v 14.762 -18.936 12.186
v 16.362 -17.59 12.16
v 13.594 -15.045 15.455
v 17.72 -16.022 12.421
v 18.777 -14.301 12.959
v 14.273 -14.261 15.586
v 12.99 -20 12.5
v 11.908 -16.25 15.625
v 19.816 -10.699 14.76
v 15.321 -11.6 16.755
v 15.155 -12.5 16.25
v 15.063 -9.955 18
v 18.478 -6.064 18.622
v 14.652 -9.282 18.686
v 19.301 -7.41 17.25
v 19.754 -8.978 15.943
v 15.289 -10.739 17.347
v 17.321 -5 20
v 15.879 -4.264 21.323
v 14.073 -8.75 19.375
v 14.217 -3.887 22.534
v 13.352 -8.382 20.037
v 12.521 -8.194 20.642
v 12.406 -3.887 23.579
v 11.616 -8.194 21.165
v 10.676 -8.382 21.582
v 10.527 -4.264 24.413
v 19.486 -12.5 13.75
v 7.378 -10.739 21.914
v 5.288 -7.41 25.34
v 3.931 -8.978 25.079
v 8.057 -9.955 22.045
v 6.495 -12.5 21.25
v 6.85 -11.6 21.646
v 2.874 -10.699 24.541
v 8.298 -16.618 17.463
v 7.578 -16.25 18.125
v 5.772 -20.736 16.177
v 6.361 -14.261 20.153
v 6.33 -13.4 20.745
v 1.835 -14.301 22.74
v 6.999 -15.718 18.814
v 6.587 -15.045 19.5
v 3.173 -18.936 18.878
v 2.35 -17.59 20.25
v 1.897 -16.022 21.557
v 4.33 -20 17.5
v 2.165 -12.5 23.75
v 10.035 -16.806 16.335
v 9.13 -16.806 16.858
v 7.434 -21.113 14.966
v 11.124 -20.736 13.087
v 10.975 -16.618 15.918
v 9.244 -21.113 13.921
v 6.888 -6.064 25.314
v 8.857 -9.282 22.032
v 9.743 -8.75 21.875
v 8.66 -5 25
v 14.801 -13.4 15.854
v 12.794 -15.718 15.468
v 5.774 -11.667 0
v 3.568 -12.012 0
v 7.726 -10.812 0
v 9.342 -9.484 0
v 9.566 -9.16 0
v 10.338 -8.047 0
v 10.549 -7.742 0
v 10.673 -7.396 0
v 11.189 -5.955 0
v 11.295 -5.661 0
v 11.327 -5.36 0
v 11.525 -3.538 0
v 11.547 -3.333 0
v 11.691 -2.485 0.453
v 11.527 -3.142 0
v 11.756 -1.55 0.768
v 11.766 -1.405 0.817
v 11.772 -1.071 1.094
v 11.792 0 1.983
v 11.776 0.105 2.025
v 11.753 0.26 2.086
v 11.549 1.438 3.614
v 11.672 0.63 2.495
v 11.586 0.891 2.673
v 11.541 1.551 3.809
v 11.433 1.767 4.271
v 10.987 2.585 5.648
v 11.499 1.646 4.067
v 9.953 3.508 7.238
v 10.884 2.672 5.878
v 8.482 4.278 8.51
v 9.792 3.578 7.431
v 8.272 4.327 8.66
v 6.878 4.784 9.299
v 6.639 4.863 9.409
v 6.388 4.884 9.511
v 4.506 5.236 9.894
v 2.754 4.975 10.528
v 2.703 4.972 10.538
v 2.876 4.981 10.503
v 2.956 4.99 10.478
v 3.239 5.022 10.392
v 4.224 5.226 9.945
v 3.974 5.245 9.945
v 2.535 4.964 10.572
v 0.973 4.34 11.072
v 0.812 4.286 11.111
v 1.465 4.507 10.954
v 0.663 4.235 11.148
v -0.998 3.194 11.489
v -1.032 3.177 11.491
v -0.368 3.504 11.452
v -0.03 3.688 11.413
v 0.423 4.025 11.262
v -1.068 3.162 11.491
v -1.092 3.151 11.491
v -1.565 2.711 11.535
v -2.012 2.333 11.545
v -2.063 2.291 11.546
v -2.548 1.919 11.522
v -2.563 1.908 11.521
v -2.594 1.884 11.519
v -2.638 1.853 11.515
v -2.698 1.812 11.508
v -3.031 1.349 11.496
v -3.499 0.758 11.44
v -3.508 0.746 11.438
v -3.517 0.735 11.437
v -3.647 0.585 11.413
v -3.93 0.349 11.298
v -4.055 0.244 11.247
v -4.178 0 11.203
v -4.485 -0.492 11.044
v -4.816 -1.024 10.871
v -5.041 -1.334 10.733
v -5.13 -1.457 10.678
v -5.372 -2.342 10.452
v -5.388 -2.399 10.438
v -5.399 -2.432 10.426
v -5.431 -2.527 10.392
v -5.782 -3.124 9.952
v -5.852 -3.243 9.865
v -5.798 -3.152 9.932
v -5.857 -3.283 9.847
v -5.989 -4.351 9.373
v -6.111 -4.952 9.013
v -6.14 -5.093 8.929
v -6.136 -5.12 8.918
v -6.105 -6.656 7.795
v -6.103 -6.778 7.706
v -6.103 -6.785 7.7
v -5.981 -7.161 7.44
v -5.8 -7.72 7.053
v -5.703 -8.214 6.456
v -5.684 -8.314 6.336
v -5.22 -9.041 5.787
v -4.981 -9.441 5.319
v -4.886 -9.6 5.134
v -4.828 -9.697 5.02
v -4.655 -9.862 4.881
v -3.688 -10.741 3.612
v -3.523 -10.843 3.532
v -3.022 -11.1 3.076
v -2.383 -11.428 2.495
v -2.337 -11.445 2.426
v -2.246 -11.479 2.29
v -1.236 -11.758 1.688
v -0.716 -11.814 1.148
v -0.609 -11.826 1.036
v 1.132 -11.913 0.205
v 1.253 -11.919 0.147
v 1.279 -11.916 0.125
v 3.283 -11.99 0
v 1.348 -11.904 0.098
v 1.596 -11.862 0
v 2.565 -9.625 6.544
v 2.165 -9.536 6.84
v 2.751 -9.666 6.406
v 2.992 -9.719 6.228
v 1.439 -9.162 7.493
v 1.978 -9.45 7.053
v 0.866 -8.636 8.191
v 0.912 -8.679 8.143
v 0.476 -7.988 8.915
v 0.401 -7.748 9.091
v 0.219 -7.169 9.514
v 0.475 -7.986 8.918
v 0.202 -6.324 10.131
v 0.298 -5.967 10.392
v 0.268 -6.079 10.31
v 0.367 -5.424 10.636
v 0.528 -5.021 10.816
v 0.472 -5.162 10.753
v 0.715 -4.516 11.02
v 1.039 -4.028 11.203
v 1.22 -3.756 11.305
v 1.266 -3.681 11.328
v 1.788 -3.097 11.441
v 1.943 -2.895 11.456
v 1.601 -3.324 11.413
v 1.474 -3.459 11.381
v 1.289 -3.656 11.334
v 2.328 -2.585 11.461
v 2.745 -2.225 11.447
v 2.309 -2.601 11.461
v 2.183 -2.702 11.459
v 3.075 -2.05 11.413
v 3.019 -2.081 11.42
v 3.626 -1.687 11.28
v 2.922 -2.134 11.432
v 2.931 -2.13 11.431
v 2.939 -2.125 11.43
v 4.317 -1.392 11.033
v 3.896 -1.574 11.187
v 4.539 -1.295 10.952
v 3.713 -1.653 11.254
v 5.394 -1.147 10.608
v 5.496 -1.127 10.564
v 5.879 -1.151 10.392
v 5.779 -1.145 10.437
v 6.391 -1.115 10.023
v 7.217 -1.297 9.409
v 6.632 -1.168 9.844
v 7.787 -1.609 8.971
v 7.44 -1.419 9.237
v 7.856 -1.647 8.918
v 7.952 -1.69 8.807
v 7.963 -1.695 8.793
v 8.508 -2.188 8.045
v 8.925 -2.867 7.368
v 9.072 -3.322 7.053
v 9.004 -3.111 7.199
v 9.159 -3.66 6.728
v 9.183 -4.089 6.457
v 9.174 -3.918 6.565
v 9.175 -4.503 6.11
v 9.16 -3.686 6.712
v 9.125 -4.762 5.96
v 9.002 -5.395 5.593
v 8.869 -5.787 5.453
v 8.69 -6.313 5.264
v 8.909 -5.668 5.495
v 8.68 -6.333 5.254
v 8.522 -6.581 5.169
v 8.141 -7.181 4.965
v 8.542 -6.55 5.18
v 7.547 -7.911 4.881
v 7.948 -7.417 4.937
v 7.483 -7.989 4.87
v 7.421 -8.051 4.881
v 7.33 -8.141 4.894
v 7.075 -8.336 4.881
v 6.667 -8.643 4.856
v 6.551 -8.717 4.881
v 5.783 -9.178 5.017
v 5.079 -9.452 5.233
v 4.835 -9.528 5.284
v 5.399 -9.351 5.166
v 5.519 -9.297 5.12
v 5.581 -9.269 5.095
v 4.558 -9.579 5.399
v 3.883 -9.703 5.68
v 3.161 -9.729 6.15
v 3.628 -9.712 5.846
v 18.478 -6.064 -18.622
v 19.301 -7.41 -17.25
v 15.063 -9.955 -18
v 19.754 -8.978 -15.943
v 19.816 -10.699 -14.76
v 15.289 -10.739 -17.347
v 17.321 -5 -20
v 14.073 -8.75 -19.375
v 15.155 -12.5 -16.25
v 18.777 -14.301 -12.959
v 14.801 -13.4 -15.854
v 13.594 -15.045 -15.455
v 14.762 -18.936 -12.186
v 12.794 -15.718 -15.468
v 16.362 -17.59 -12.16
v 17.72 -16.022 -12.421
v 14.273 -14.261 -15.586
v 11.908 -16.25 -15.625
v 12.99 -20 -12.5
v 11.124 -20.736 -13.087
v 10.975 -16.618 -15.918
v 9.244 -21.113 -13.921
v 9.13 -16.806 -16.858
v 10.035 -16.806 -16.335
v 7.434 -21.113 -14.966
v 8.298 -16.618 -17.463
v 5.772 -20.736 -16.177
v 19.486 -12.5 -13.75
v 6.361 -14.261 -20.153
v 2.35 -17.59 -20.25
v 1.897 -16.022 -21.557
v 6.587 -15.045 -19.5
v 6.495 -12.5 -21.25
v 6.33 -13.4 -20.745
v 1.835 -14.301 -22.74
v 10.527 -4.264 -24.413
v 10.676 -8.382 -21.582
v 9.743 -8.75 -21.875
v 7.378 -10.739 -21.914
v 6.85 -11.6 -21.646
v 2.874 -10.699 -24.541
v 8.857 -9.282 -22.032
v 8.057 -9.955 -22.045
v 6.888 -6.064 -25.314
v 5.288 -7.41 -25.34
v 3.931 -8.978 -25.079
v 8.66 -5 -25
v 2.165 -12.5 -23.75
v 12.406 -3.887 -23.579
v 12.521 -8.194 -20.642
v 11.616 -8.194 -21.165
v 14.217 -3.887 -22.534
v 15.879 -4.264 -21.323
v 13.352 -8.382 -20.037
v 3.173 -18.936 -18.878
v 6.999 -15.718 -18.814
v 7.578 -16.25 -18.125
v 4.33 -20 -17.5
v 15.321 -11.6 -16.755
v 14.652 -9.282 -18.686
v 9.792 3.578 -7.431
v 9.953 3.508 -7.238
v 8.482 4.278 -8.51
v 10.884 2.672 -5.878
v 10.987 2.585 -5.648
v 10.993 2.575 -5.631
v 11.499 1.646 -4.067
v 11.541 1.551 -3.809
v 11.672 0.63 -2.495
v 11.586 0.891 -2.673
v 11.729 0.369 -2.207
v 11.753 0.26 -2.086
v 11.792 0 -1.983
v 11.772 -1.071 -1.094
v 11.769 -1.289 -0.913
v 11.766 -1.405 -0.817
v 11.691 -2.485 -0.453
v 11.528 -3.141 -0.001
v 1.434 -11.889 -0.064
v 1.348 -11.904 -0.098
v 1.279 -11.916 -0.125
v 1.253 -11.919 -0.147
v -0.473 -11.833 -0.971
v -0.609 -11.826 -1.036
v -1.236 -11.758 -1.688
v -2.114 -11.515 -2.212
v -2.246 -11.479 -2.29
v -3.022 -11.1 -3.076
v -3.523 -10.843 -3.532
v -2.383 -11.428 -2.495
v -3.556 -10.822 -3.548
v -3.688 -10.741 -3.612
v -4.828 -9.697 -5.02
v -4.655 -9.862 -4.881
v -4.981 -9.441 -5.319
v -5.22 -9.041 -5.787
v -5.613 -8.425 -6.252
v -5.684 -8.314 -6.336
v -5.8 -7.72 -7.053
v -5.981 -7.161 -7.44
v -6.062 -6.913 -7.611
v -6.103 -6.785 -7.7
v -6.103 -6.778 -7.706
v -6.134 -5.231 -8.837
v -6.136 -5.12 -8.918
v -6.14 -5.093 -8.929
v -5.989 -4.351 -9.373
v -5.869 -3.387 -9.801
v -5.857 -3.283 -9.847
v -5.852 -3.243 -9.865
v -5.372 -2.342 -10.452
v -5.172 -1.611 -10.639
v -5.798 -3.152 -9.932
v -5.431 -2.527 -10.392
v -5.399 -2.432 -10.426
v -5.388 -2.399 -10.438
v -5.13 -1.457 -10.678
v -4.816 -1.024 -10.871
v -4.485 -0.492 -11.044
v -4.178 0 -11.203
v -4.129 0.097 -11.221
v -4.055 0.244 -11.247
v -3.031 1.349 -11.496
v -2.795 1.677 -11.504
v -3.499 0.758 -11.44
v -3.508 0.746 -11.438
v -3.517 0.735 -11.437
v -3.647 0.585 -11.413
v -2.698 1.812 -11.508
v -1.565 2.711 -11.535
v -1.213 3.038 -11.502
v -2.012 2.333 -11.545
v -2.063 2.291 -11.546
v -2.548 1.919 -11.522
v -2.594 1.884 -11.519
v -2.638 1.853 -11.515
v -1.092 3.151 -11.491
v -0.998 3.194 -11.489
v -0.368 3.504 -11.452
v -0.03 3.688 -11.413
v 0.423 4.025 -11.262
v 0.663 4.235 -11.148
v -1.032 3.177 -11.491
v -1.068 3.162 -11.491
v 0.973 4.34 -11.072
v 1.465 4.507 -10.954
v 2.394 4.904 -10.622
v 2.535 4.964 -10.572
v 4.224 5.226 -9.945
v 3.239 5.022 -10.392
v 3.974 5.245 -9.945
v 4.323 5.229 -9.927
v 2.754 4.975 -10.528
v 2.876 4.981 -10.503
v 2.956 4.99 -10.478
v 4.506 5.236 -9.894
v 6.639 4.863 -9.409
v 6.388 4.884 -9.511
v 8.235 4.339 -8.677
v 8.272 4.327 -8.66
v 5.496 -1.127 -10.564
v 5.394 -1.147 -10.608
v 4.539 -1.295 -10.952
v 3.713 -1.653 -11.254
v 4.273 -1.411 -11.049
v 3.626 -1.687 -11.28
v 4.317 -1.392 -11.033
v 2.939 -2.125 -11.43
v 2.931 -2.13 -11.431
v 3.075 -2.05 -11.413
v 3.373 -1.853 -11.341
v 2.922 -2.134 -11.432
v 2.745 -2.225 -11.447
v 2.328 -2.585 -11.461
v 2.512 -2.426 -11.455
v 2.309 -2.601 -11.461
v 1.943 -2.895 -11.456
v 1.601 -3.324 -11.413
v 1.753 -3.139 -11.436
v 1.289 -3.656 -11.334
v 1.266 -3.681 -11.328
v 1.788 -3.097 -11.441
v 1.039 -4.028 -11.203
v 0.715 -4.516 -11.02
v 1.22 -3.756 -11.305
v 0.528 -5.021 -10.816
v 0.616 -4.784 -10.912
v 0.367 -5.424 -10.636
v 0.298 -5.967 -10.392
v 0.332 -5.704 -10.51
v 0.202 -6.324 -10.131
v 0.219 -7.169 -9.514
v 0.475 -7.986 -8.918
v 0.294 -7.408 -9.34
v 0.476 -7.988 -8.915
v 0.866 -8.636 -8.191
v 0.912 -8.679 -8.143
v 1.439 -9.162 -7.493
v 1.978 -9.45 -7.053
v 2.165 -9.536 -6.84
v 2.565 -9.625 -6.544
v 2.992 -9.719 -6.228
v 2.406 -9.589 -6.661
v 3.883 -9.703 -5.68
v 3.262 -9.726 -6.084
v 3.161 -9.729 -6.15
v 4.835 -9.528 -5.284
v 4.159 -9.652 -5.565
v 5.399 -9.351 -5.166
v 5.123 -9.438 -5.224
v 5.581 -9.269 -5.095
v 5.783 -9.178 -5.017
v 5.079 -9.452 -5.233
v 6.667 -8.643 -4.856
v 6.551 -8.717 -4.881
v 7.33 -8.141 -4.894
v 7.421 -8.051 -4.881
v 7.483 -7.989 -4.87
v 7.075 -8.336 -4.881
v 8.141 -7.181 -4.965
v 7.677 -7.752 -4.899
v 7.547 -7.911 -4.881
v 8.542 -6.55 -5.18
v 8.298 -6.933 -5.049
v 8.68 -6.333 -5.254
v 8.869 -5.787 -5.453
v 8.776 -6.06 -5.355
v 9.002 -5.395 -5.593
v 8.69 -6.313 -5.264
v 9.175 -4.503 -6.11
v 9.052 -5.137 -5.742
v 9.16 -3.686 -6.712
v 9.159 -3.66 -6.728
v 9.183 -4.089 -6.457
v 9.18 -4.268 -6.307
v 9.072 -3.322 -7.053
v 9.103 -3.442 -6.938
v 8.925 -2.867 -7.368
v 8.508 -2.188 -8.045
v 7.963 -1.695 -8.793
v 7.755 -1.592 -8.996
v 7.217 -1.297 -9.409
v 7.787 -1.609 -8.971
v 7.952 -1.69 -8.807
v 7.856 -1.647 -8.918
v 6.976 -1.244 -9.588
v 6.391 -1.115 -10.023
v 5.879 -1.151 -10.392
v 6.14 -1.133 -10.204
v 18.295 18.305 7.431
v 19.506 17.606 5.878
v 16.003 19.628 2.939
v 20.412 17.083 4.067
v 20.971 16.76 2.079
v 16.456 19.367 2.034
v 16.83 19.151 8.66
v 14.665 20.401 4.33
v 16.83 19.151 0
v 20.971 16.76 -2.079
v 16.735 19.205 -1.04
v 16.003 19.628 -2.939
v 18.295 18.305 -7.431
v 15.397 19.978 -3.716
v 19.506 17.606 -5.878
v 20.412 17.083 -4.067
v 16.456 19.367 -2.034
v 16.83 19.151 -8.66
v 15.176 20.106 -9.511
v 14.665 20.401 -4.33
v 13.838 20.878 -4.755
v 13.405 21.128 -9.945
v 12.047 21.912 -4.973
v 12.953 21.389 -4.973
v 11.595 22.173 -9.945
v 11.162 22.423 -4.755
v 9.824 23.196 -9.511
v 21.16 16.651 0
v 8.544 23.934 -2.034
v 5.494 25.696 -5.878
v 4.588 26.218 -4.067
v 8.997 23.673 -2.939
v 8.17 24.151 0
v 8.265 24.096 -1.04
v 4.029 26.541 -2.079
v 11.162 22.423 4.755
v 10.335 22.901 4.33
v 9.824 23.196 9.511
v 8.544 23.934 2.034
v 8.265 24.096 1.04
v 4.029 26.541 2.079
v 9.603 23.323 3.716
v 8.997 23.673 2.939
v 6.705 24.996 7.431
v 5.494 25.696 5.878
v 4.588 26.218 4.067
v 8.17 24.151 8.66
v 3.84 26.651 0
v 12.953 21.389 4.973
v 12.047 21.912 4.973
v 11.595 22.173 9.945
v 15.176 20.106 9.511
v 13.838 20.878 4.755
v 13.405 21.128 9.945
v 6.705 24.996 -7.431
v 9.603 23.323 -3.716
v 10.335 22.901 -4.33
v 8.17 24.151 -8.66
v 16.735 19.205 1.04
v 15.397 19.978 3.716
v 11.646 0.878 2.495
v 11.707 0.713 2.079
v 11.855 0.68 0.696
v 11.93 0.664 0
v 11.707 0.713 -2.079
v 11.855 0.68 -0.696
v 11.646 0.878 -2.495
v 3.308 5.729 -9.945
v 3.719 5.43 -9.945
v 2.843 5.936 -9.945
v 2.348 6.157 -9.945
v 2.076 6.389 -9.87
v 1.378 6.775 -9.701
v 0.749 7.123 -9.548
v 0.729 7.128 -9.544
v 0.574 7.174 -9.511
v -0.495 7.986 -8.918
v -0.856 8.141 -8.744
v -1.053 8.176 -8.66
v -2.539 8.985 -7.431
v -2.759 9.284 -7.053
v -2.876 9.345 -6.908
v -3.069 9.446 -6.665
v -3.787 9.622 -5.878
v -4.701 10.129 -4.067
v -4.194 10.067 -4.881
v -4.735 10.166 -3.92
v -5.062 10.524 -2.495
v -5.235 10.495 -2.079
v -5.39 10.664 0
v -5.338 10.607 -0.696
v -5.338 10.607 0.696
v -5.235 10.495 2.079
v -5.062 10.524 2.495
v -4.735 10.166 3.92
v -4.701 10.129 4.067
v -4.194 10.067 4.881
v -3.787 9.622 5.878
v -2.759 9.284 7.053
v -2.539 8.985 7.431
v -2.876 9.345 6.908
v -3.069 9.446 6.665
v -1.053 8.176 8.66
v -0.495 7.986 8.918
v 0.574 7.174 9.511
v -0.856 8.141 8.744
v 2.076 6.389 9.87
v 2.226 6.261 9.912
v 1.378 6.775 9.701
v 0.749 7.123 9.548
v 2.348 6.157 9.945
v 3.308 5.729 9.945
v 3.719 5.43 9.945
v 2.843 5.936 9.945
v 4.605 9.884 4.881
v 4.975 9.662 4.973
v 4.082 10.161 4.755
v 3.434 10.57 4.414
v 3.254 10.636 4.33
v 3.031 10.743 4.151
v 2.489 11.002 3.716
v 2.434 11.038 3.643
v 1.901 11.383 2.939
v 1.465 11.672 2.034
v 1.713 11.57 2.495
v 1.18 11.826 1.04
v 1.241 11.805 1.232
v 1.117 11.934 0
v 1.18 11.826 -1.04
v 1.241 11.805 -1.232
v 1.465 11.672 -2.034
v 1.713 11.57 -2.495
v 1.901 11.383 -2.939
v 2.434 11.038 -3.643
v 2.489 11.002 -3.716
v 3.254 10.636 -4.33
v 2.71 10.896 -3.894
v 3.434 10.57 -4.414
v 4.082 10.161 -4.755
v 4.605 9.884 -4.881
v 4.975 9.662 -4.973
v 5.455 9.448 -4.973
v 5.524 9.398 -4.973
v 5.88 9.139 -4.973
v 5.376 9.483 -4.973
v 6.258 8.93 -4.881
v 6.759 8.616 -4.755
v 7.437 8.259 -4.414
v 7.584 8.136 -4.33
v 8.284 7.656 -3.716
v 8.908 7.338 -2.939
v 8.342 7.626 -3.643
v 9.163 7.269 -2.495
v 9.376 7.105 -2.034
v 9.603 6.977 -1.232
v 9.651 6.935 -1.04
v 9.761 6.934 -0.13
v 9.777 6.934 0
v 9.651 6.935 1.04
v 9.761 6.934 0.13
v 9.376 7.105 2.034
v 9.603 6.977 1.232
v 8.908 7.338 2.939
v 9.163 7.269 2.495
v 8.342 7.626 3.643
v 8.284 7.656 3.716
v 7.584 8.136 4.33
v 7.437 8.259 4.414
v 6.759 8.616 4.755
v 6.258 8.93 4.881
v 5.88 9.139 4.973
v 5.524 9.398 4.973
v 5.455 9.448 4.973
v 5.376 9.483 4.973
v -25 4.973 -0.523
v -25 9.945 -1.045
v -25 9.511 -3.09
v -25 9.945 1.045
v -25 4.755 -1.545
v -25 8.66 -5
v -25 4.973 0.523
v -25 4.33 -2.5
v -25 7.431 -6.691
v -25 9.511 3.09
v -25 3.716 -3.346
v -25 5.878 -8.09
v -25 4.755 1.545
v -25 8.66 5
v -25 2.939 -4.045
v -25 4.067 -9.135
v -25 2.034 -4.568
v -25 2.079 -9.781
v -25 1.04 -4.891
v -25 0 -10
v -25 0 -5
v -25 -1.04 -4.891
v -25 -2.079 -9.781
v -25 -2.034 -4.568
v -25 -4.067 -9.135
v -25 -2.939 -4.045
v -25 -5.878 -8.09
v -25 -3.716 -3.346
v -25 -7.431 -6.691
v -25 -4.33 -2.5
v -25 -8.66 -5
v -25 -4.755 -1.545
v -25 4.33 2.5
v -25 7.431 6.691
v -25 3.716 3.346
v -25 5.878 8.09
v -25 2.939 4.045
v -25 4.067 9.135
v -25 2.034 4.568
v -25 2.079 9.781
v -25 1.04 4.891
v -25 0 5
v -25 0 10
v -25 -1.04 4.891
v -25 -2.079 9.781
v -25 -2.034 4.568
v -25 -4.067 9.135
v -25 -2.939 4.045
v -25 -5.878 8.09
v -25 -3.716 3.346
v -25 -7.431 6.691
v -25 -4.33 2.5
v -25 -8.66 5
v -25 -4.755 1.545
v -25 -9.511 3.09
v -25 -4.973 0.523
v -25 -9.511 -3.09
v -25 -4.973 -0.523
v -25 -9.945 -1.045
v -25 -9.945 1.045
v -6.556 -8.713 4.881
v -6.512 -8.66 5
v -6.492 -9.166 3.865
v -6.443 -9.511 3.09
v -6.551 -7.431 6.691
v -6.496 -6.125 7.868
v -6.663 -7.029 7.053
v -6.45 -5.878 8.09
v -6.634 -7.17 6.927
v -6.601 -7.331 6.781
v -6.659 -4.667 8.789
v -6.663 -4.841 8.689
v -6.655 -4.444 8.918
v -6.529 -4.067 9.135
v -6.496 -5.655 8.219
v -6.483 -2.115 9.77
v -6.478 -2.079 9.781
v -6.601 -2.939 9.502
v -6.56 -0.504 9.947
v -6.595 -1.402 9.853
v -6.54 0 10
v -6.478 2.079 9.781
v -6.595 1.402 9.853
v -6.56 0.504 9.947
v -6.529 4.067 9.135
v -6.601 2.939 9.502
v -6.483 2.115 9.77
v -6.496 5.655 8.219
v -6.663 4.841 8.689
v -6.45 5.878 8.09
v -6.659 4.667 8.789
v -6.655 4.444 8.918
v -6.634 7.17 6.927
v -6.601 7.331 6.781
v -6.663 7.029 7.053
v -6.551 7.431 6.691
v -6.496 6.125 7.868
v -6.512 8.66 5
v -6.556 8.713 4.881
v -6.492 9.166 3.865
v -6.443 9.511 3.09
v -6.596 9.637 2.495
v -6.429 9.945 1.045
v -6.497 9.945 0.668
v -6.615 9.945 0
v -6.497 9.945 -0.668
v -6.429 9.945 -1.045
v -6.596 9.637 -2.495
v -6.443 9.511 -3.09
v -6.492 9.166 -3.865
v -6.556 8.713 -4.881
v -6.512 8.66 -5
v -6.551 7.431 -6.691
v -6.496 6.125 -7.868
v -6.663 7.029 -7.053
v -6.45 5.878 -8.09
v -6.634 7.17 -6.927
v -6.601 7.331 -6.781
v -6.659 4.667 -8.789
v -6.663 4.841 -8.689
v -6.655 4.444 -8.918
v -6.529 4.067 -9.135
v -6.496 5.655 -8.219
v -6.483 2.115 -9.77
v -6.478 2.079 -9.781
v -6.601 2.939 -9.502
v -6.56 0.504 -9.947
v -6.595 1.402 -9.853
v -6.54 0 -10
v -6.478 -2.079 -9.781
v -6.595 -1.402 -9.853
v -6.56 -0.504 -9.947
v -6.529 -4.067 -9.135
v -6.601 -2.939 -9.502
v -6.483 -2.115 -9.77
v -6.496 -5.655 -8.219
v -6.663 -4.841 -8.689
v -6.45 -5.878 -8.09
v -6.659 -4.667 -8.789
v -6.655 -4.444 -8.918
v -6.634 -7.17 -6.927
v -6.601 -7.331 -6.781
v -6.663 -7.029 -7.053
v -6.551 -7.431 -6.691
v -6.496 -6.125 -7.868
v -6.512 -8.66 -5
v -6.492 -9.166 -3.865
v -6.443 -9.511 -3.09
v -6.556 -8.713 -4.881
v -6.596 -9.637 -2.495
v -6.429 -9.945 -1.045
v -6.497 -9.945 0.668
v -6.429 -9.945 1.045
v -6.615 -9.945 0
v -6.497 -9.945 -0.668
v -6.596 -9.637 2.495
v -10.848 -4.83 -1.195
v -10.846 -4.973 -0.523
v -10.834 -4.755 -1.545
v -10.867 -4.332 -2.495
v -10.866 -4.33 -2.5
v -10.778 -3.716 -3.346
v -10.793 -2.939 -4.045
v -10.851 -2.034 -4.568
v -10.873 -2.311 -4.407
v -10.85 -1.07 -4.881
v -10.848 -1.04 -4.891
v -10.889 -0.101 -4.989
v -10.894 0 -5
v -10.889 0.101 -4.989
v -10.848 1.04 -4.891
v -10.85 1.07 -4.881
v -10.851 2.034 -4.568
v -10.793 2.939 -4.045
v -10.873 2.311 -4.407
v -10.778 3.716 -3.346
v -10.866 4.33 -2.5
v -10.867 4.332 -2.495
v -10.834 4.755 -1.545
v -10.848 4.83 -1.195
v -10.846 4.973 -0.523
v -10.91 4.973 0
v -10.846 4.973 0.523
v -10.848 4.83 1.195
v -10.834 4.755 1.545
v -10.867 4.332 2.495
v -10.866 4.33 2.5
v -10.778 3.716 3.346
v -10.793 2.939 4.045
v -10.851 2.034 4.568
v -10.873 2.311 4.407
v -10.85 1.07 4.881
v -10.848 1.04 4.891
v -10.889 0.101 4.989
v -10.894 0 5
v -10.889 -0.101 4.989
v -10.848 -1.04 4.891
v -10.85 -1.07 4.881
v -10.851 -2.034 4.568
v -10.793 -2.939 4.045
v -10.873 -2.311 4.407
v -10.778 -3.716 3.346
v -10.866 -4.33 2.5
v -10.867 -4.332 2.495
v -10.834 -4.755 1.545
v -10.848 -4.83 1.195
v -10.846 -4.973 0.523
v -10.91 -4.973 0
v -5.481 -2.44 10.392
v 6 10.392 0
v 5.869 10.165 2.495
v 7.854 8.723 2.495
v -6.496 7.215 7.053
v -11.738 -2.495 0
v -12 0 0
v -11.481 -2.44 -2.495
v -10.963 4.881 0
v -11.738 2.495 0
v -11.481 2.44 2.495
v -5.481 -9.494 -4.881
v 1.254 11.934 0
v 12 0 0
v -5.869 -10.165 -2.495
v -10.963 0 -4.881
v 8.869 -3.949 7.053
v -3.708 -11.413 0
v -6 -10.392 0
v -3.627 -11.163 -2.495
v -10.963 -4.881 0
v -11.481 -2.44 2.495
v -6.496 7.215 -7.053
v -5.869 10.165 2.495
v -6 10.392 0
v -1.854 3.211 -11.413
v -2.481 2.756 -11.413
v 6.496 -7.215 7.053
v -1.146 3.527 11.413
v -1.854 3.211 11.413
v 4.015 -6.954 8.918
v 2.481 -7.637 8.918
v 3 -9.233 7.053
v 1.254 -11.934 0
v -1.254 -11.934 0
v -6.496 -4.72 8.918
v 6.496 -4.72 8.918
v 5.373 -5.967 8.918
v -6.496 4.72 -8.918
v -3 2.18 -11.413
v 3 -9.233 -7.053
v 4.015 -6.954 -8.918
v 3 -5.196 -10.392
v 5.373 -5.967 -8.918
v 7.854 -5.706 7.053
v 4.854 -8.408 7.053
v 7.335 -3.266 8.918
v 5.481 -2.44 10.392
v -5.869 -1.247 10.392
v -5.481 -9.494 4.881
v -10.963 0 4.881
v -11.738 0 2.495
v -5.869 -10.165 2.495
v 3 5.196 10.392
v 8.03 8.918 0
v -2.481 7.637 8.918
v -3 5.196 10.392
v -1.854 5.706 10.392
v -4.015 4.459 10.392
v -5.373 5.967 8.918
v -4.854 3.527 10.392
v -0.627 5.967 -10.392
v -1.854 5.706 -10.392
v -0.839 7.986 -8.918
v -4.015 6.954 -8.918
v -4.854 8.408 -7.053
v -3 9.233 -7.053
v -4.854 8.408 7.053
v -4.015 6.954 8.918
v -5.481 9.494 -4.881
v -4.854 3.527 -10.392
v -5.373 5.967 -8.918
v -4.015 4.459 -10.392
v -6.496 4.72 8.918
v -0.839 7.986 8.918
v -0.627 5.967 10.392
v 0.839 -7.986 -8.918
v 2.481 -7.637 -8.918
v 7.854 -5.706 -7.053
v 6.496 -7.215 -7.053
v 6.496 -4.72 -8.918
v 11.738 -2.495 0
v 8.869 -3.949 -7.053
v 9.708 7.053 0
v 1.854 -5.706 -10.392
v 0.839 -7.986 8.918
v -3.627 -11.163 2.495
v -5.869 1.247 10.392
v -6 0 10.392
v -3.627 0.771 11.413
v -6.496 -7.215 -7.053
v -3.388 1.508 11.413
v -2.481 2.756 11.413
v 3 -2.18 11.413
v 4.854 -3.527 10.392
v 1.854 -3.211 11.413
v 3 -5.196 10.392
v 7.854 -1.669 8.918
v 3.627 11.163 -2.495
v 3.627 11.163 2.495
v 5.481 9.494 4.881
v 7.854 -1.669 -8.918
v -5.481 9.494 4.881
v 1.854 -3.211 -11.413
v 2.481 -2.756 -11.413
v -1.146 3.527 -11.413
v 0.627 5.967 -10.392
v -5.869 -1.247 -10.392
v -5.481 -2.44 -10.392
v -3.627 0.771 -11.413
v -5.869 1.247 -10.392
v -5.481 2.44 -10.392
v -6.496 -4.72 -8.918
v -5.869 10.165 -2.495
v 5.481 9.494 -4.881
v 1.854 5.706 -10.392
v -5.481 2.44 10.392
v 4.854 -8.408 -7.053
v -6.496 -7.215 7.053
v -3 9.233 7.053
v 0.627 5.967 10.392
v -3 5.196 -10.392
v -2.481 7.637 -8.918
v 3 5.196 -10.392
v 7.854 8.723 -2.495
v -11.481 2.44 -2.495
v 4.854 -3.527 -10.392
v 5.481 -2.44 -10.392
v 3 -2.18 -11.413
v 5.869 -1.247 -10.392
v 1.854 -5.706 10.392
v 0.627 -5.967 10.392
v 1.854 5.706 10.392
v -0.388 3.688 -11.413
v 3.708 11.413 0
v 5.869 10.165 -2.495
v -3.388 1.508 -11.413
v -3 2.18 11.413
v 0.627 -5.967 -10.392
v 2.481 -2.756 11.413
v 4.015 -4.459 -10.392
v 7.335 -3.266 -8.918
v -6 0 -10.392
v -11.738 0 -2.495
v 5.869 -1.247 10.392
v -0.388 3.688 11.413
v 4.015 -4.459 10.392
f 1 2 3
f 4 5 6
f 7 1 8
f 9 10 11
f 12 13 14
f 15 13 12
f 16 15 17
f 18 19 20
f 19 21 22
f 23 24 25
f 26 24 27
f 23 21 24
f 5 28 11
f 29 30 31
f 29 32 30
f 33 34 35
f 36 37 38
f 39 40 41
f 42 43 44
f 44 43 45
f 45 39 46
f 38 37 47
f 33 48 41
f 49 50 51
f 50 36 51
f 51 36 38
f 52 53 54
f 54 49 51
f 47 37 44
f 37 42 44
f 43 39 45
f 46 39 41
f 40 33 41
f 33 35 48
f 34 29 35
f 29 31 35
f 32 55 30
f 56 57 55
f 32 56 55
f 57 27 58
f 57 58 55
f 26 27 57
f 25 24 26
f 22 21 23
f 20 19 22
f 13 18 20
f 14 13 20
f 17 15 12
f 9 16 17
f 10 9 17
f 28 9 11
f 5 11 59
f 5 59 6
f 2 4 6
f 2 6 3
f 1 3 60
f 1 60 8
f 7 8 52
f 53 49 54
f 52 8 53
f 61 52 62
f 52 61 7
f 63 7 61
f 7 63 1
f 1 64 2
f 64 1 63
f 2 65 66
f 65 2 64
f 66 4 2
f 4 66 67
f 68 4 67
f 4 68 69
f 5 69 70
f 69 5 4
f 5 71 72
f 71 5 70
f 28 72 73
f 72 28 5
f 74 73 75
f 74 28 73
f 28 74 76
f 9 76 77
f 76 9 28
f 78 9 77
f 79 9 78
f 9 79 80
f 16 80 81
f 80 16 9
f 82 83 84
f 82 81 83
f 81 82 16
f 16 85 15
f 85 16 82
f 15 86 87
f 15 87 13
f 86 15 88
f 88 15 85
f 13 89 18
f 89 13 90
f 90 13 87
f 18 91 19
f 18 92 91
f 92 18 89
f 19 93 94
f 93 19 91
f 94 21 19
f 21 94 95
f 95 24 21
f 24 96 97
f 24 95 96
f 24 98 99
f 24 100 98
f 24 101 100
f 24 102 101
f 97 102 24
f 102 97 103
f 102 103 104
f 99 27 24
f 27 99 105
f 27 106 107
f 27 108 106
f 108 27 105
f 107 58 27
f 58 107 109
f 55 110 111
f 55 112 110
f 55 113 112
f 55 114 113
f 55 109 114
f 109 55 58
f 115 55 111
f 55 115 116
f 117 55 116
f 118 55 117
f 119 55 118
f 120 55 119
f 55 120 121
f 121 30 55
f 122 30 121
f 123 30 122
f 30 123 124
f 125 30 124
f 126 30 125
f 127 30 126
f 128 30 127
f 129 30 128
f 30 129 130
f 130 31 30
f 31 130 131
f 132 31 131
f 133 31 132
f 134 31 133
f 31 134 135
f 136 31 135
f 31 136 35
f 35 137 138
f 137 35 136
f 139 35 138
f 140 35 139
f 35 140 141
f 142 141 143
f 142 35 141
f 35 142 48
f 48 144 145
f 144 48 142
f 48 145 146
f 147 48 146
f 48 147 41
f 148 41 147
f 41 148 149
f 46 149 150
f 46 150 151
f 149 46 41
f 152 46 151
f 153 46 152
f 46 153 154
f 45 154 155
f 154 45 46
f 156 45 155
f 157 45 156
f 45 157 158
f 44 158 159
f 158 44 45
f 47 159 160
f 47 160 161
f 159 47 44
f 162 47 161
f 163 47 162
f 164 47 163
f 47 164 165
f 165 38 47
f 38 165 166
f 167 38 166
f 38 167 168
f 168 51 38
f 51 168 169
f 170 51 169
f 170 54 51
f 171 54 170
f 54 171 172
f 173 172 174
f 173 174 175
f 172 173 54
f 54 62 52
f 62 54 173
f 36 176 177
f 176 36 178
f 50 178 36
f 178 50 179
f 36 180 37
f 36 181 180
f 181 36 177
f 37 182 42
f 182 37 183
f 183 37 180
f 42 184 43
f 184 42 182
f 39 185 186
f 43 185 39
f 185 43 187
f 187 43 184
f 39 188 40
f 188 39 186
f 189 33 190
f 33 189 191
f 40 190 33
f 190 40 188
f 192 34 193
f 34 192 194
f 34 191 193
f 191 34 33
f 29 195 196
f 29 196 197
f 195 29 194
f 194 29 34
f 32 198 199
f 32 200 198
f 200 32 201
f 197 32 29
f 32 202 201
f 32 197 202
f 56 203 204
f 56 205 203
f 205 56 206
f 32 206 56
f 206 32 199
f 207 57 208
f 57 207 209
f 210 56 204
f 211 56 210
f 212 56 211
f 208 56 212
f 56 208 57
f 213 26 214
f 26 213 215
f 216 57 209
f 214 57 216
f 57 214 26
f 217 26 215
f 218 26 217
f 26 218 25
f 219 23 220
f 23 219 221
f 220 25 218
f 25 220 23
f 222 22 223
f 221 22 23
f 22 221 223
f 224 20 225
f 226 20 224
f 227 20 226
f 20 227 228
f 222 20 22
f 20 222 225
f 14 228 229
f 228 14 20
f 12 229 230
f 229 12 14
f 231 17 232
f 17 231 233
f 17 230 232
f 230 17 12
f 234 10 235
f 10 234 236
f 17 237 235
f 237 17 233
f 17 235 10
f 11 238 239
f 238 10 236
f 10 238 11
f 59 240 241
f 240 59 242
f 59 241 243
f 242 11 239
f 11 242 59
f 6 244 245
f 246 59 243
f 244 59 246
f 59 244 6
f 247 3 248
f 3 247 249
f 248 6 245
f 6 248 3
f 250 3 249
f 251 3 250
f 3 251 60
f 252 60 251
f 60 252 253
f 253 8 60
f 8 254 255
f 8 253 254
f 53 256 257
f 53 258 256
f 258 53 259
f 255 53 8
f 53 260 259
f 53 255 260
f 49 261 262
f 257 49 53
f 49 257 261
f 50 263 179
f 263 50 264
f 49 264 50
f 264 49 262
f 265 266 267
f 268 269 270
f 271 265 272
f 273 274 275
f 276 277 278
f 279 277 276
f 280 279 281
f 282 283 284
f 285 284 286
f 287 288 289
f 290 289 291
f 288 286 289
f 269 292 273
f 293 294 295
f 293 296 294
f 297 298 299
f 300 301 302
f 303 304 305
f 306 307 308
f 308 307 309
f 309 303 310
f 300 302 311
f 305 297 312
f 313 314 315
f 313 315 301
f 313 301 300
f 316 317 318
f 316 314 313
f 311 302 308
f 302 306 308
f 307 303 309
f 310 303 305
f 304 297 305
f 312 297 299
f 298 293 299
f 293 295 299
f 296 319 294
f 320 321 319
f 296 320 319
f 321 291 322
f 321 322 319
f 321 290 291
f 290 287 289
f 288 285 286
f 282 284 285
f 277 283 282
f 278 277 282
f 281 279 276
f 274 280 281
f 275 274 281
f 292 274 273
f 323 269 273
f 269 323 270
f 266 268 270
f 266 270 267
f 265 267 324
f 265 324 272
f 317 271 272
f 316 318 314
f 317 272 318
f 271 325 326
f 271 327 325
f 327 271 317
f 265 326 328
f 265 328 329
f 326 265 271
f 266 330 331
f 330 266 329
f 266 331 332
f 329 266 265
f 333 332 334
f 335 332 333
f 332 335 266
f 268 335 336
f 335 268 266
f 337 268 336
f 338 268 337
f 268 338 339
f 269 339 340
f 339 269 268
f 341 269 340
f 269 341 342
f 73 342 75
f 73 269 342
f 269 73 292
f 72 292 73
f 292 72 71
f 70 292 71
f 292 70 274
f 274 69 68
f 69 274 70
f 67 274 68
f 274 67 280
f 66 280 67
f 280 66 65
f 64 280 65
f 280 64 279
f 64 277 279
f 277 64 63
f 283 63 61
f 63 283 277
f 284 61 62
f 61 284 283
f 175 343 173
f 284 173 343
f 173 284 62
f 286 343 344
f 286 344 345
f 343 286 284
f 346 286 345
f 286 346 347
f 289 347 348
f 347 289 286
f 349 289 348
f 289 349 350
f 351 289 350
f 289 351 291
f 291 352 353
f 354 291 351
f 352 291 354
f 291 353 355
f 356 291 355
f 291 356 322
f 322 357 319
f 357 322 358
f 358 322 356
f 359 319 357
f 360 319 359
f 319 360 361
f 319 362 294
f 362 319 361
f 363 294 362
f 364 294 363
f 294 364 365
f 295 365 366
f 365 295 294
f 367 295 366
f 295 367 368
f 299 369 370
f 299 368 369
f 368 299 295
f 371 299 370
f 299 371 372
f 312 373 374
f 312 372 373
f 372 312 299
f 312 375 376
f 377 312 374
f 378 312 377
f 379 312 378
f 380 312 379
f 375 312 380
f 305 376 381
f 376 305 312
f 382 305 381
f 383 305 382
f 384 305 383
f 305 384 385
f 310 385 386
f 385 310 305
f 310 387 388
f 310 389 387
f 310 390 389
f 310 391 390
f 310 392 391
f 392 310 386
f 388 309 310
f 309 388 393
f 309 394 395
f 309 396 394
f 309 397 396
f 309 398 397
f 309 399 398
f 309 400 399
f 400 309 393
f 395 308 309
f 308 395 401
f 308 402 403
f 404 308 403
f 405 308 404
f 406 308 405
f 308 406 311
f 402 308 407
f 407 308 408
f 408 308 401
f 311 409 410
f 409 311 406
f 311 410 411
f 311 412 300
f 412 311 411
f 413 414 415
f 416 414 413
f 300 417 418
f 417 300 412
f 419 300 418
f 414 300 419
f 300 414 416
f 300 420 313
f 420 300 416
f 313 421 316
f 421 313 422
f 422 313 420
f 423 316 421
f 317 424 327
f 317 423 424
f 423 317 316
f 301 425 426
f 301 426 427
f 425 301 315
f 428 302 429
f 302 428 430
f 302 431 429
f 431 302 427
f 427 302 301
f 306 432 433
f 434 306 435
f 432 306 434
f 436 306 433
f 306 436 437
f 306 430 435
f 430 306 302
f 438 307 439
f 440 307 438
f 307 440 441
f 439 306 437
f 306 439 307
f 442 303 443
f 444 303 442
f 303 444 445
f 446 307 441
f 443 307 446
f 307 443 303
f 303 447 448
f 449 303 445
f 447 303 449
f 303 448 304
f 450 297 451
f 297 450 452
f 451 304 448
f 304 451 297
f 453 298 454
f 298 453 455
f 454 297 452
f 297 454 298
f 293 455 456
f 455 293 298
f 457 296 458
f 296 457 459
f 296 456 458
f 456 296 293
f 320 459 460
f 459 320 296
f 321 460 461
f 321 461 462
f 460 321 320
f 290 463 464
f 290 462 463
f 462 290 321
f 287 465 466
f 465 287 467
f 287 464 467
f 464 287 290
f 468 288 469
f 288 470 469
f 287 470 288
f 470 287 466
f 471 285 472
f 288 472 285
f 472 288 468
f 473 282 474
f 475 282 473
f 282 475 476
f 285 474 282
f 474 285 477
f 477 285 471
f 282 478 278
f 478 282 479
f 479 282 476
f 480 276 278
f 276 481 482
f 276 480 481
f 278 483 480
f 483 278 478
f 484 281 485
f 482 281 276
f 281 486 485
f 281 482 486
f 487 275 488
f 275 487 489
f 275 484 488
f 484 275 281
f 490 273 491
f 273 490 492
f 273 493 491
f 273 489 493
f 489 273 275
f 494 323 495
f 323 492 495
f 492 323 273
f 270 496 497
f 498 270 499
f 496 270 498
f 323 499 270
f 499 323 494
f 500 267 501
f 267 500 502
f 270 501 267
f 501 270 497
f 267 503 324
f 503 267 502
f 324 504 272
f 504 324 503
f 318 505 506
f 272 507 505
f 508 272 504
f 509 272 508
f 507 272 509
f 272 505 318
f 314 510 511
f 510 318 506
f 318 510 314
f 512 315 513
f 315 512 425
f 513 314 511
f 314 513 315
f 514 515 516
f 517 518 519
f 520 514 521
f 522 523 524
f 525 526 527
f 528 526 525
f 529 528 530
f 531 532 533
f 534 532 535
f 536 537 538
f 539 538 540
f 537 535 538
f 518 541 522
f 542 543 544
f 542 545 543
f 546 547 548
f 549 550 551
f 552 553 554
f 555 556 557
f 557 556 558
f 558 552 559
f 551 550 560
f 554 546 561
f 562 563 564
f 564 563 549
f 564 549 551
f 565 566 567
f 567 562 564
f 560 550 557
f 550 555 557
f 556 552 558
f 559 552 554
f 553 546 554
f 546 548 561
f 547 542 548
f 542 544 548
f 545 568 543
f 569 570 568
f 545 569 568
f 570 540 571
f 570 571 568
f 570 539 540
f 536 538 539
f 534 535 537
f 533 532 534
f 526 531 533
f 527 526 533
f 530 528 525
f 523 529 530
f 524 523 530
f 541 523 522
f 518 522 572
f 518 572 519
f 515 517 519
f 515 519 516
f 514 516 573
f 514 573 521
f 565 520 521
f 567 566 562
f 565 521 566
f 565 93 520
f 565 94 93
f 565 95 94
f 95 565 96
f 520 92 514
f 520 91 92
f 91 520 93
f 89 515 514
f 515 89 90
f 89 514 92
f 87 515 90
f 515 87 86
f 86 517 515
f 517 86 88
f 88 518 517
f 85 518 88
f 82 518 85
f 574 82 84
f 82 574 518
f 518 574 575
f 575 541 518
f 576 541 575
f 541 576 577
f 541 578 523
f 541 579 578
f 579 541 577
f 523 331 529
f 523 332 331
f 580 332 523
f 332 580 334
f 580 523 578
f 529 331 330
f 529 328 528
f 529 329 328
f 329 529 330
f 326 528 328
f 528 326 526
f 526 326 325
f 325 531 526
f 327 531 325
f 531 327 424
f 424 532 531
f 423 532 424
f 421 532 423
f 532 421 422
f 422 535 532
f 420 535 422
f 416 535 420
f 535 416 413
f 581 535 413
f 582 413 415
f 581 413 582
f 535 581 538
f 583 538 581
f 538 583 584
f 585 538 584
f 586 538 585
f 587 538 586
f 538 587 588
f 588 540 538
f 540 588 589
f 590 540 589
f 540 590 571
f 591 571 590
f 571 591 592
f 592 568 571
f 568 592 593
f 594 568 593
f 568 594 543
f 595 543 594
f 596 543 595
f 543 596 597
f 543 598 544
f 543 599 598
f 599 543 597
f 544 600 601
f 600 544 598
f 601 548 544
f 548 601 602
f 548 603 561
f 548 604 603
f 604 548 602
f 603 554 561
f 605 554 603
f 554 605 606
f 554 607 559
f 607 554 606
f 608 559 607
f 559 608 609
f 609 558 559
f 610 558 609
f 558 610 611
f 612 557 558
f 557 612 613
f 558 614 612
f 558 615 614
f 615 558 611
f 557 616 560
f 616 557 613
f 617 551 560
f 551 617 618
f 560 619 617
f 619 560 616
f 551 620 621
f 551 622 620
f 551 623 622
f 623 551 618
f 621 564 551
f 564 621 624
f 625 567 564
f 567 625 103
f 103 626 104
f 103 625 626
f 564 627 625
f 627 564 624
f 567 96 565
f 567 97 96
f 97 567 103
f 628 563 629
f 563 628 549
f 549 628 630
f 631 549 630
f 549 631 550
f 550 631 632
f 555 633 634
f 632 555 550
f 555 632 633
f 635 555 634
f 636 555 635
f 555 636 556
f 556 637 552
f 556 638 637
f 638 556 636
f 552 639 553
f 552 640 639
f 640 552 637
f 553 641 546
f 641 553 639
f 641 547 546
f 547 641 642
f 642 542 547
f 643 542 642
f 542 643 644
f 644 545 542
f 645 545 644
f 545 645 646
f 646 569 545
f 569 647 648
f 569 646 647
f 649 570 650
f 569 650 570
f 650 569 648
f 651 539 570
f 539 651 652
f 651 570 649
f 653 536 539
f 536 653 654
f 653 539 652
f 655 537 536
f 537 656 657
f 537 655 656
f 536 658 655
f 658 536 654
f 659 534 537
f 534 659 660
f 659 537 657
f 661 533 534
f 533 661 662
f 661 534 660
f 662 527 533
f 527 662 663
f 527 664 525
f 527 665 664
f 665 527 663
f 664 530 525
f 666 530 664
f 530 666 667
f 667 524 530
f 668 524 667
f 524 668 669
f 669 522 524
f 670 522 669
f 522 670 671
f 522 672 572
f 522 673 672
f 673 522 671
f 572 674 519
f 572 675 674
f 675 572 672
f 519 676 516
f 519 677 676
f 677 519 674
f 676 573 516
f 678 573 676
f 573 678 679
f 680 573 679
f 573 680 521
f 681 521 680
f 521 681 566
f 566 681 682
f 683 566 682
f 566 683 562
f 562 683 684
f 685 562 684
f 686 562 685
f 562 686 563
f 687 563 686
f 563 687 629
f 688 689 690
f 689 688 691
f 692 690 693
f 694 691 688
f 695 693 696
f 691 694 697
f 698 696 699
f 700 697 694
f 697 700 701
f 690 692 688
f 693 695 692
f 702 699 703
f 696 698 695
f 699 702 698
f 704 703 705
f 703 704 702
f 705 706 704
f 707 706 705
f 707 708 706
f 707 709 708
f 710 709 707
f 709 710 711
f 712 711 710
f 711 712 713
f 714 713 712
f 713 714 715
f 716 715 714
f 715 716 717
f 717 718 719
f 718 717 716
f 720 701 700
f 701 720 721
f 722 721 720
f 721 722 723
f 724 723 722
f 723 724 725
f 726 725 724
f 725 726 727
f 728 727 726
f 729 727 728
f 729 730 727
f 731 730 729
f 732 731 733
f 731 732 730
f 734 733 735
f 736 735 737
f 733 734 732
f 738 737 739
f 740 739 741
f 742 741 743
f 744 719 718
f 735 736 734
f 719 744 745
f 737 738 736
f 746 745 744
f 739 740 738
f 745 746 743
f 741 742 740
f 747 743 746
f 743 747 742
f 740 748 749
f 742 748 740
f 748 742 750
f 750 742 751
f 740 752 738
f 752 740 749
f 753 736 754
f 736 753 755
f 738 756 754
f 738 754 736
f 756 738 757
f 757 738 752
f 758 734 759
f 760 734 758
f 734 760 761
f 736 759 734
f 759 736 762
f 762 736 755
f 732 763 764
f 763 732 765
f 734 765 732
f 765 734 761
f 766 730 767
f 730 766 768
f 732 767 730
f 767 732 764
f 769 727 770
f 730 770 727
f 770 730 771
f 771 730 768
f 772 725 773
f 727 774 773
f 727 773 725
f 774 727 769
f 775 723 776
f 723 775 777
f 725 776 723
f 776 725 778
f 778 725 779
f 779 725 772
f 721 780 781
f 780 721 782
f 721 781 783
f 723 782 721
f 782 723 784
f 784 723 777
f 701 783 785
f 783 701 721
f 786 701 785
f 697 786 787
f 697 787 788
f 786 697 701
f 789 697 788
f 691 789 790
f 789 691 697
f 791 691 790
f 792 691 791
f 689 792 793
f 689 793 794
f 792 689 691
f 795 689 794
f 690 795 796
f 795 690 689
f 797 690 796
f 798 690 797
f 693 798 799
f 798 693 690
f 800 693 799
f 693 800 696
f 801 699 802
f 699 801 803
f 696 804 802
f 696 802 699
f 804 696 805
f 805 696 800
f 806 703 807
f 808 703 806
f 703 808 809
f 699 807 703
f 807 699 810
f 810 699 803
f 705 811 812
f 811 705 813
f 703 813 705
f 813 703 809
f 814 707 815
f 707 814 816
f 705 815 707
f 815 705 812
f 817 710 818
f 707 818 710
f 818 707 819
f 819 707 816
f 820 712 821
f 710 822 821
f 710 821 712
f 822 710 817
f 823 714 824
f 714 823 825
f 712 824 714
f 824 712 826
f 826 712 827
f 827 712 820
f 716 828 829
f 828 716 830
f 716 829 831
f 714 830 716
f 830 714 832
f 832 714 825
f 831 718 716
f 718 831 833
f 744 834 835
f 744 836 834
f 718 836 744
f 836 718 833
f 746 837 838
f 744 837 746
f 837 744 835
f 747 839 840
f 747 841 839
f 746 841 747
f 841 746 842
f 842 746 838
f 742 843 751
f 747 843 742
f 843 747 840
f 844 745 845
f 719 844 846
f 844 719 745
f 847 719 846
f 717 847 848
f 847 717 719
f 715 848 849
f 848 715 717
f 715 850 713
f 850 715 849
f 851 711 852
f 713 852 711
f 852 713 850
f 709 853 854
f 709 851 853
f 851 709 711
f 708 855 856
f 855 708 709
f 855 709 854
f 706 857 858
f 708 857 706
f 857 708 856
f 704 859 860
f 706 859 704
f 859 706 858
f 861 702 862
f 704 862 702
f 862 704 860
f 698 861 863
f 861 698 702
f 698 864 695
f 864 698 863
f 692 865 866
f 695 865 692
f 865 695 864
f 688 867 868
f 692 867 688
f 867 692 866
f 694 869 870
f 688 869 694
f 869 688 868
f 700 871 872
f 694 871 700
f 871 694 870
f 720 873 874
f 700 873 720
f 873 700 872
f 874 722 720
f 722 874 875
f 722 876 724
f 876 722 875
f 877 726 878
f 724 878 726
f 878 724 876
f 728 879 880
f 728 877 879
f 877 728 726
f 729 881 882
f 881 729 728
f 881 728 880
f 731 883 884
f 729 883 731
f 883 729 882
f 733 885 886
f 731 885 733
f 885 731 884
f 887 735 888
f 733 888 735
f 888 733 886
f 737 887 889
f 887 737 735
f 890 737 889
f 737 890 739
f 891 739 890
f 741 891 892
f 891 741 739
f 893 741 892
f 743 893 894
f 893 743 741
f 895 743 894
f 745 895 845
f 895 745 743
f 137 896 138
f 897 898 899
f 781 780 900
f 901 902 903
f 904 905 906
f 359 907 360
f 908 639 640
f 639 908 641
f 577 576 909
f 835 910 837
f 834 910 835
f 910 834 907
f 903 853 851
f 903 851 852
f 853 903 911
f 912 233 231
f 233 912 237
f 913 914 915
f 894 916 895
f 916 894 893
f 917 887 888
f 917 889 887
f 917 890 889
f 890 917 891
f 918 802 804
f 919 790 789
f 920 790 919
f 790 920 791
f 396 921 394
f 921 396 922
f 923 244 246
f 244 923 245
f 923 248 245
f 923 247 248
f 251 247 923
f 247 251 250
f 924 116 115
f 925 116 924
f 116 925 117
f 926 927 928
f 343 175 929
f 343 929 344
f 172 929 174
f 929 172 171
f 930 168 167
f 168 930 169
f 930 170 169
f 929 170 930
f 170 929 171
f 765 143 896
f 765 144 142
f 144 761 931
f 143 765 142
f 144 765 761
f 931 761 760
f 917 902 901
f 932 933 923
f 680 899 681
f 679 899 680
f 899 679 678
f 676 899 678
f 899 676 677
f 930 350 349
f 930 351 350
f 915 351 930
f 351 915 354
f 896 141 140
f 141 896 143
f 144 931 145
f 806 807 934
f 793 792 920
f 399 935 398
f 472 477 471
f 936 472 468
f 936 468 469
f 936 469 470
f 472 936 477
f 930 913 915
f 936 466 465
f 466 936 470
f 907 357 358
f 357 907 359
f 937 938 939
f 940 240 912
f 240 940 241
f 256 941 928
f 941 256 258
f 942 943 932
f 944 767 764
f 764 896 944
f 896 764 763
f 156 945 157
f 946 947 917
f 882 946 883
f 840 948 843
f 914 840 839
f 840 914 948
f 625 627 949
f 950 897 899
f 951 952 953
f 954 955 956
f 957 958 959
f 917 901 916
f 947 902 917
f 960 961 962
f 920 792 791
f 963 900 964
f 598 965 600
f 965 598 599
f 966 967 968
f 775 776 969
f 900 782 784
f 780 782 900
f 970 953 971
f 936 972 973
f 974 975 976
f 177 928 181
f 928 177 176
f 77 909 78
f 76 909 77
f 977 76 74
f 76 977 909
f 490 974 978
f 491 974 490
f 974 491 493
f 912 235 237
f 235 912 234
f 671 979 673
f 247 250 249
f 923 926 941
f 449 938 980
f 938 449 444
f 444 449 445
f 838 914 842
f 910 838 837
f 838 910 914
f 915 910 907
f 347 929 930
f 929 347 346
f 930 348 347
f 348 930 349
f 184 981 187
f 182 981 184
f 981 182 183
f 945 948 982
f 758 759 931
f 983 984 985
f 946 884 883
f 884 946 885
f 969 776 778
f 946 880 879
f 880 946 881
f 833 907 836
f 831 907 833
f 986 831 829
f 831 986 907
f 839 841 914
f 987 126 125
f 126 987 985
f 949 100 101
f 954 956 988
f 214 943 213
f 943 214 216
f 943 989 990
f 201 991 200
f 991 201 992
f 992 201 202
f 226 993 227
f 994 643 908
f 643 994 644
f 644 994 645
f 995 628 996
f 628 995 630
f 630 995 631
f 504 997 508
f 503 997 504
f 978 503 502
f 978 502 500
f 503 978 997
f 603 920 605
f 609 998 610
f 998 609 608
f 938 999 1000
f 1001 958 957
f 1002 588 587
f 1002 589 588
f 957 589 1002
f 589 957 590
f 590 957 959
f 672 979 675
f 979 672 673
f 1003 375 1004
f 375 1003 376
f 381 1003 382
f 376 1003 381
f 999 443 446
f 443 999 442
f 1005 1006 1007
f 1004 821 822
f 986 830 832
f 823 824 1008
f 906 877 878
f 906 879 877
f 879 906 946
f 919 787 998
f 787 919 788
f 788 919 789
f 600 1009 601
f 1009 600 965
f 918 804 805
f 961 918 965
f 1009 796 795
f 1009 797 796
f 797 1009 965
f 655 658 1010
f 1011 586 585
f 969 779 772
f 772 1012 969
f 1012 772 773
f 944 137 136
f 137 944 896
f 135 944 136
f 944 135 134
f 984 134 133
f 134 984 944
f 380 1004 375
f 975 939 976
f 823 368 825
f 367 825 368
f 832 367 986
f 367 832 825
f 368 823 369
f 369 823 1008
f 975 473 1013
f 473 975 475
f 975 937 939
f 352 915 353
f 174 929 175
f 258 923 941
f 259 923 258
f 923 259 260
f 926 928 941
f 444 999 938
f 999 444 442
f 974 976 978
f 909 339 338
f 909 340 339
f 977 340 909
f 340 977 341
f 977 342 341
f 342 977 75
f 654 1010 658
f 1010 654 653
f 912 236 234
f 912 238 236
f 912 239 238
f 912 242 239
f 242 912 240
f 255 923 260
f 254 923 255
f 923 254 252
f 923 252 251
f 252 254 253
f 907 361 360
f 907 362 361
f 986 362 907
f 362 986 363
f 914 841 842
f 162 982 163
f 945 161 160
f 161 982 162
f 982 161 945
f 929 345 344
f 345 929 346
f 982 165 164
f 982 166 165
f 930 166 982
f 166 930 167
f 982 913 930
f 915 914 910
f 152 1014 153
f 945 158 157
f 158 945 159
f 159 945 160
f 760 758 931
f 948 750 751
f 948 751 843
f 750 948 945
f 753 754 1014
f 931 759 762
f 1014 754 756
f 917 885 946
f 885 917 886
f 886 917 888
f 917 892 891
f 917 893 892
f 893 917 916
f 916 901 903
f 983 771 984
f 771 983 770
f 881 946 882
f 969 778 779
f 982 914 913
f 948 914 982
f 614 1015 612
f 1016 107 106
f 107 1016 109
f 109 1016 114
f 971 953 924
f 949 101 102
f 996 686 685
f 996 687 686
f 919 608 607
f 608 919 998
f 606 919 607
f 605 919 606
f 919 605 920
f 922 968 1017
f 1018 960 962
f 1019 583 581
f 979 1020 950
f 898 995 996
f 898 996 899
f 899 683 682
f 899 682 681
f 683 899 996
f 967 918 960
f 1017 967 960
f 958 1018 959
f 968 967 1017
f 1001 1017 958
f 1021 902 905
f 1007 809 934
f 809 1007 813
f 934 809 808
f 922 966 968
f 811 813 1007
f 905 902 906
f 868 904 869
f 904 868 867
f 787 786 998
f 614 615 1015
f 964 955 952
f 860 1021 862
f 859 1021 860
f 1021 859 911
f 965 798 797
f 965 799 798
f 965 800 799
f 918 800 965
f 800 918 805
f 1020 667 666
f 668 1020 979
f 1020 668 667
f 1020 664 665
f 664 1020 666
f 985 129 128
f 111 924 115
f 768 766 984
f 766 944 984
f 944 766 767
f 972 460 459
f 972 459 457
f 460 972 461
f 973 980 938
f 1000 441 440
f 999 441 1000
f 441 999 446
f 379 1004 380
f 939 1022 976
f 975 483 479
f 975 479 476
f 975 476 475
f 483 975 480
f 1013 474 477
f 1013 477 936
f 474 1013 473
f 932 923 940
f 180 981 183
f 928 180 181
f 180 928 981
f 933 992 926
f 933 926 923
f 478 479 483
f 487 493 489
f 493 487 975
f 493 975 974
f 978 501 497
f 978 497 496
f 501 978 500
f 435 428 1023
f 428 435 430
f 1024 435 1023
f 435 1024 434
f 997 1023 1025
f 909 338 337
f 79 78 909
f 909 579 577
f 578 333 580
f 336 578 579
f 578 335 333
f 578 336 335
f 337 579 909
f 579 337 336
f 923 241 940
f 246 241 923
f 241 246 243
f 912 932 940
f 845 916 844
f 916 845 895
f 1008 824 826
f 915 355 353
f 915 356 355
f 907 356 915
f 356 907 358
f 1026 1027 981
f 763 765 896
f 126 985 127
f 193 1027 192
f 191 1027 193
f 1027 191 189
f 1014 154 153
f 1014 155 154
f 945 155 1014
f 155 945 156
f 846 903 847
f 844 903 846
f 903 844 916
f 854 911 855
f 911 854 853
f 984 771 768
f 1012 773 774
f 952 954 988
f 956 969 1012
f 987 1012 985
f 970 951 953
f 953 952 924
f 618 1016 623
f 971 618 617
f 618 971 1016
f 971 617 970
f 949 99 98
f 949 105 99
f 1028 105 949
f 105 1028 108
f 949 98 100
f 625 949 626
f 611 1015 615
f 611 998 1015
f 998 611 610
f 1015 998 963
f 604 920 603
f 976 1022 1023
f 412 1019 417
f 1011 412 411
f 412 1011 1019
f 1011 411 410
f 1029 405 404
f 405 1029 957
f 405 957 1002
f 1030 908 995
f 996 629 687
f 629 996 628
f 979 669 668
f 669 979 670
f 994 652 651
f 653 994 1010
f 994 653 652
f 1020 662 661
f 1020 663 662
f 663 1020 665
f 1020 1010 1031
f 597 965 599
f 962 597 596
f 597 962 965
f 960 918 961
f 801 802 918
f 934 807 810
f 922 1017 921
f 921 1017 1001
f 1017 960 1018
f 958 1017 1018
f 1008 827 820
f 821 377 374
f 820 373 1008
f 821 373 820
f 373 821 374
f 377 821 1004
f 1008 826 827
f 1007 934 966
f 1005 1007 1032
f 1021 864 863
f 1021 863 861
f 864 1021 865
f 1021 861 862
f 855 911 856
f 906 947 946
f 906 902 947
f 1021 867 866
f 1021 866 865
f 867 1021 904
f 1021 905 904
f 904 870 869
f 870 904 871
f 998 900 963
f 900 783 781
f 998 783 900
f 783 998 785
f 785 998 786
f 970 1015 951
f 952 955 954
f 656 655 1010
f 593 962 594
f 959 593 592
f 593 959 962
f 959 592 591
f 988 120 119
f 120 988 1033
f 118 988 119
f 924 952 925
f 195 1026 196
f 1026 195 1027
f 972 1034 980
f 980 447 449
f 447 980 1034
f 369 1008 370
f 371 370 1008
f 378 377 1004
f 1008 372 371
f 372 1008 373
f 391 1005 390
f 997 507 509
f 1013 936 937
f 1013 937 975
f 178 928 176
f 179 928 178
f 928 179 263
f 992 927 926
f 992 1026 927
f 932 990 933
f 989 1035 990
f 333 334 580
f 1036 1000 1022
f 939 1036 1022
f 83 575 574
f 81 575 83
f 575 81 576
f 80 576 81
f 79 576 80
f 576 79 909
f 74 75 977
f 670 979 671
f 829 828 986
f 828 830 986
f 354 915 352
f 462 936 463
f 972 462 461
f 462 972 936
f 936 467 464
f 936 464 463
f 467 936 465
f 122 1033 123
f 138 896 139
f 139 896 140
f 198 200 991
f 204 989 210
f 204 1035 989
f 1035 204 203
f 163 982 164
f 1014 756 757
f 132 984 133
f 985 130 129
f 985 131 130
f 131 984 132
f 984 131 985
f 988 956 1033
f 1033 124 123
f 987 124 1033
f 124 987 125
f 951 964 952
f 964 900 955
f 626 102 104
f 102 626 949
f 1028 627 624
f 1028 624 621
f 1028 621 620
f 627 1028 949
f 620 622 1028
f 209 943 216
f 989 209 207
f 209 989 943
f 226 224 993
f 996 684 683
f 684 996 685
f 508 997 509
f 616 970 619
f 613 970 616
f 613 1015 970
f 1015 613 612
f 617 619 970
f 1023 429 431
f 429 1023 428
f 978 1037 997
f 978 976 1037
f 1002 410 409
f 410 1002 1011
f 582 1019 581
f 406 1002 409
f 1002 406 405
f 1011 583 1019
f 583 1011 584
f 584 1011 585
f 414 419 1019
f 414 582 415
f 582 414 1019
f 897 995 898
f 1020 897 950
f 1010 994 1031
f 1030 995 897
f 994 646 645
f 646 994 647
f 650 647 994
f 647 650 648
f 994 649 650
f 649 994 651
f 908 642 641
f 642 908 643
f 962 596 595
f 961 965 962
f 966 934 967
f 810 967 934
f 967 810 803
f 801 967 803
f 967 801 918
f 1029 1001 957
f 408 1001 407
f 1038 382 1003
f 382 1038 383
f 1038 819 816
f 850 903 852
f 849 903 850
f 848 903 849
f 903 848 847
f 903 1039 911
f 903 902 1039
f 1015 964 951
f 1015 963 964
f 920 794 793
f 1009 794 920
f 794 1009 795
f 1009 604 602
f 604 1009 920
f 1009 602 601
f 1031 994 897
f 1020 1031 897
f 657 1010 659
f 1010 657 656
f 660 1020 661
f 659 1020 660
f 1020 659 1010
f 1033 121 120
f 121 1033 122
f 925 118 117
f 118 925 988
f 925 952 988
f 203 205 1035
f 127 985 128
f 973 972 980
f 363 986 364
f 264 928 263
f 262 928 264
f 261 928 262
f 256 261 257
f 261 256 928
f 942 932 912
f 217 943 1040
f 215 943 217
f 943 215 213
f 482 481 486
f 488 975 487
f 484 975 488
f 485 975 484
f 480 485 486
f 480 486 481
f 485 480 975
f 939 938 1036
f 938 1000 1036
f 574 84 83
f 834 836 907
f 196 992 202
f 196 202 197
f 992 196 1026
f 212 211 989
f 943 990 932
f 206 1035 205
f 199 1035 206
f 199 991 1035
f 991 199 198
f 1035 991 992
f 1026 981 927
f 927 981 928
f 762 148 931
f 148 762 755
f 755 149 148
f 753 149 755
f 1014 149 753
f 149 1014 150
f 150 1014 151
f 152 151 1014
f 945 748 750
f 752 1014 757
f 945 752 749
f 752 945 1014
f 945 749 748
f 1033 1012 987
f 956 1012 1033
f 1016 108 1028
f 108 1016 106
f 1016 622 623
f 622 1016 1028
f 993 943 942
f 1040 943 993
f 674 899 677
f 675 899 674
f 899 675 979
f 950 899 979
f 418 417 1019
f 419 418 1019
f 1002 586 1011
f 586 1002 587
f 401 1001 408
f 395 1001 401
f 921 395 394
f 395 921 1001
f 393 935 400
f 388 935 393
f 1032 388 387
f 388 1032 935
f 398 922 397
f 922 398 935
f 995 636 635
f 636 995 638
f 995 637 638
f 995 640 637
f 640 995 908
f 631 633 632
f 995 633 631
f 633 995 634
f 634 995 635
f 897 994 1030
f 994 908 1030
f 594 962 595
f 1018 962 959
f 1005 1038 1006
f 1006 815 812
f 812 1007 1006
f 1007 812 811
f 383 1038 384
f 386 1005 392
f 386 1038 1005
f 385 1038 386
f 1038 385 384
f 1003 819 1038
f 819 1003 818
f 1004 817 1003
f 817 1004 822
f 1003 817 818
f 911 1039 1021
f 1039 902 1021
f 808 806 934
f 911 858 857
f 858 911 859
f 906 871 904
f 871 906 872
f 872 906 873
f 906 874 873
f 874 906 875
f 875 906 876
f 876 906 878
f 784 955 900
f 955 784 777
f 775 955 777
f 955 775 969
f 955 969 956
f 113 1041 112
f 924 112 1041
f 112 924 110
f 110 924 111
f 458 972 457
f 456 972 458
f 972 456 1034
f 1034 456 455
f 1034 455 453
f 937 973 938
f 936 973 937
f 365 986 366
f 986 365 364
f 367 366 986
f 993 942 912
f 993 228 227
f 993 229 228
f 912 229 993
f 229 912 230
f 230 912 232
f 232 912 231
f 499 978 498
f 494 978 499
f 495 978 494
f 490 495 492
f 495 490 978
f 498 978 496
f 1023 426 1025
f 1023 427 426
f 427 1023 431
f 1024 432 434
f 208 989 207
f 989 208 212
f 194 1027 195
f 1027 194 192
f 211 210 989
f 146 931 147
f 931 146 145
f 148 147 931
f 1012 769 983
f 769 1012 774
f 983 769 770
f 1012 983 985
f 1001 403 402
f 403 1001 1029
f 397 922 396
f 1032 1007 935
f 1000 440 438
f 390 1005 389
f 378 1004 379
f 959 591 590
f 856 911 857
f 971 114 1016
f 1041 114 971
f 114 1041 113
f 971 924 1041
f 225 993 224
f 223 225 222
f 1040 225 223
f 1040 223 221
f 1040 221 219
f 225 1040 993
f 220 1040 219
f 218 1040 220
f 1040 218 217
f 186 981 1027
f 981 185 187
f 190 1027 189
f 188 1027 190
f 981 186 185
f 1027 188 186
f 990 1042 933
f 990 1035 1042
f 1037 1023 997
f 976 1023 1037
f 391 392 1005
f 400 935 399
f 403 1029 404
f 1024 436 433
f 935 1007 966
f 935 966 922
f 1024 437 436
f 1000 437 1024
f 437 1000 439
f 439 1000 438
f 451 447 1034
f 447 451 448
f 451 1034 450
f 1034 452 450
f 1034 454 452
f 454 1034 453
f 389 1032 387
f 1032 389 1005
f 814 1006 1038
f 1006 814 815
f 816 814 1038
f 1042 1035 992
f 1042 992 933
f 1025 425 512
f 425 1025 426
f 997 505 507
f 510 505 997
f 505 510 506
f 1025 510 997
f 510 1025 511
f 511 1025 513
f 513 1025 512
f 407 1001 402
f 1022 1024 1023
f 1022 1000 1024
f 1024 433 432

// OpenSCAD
$fn = 30;
module leg(h, ro, ri, rot) {
    rotate(a = rot) {
        translate([0,0,5]) linear_extrude(height=h) {
            difference(){
                circle(r=ro);
                circle(r=ri);
            };
        };
    };
};
union() {
    union() {
        leg(20,10,5,[30,30,0]);
        leg(20,10,5,[150,-30,0]);
        leg(20,10,5,[270,0,-30]);
        leg(20,10,5,[0,270,0]);
    };
    sphere(r=12);
};
